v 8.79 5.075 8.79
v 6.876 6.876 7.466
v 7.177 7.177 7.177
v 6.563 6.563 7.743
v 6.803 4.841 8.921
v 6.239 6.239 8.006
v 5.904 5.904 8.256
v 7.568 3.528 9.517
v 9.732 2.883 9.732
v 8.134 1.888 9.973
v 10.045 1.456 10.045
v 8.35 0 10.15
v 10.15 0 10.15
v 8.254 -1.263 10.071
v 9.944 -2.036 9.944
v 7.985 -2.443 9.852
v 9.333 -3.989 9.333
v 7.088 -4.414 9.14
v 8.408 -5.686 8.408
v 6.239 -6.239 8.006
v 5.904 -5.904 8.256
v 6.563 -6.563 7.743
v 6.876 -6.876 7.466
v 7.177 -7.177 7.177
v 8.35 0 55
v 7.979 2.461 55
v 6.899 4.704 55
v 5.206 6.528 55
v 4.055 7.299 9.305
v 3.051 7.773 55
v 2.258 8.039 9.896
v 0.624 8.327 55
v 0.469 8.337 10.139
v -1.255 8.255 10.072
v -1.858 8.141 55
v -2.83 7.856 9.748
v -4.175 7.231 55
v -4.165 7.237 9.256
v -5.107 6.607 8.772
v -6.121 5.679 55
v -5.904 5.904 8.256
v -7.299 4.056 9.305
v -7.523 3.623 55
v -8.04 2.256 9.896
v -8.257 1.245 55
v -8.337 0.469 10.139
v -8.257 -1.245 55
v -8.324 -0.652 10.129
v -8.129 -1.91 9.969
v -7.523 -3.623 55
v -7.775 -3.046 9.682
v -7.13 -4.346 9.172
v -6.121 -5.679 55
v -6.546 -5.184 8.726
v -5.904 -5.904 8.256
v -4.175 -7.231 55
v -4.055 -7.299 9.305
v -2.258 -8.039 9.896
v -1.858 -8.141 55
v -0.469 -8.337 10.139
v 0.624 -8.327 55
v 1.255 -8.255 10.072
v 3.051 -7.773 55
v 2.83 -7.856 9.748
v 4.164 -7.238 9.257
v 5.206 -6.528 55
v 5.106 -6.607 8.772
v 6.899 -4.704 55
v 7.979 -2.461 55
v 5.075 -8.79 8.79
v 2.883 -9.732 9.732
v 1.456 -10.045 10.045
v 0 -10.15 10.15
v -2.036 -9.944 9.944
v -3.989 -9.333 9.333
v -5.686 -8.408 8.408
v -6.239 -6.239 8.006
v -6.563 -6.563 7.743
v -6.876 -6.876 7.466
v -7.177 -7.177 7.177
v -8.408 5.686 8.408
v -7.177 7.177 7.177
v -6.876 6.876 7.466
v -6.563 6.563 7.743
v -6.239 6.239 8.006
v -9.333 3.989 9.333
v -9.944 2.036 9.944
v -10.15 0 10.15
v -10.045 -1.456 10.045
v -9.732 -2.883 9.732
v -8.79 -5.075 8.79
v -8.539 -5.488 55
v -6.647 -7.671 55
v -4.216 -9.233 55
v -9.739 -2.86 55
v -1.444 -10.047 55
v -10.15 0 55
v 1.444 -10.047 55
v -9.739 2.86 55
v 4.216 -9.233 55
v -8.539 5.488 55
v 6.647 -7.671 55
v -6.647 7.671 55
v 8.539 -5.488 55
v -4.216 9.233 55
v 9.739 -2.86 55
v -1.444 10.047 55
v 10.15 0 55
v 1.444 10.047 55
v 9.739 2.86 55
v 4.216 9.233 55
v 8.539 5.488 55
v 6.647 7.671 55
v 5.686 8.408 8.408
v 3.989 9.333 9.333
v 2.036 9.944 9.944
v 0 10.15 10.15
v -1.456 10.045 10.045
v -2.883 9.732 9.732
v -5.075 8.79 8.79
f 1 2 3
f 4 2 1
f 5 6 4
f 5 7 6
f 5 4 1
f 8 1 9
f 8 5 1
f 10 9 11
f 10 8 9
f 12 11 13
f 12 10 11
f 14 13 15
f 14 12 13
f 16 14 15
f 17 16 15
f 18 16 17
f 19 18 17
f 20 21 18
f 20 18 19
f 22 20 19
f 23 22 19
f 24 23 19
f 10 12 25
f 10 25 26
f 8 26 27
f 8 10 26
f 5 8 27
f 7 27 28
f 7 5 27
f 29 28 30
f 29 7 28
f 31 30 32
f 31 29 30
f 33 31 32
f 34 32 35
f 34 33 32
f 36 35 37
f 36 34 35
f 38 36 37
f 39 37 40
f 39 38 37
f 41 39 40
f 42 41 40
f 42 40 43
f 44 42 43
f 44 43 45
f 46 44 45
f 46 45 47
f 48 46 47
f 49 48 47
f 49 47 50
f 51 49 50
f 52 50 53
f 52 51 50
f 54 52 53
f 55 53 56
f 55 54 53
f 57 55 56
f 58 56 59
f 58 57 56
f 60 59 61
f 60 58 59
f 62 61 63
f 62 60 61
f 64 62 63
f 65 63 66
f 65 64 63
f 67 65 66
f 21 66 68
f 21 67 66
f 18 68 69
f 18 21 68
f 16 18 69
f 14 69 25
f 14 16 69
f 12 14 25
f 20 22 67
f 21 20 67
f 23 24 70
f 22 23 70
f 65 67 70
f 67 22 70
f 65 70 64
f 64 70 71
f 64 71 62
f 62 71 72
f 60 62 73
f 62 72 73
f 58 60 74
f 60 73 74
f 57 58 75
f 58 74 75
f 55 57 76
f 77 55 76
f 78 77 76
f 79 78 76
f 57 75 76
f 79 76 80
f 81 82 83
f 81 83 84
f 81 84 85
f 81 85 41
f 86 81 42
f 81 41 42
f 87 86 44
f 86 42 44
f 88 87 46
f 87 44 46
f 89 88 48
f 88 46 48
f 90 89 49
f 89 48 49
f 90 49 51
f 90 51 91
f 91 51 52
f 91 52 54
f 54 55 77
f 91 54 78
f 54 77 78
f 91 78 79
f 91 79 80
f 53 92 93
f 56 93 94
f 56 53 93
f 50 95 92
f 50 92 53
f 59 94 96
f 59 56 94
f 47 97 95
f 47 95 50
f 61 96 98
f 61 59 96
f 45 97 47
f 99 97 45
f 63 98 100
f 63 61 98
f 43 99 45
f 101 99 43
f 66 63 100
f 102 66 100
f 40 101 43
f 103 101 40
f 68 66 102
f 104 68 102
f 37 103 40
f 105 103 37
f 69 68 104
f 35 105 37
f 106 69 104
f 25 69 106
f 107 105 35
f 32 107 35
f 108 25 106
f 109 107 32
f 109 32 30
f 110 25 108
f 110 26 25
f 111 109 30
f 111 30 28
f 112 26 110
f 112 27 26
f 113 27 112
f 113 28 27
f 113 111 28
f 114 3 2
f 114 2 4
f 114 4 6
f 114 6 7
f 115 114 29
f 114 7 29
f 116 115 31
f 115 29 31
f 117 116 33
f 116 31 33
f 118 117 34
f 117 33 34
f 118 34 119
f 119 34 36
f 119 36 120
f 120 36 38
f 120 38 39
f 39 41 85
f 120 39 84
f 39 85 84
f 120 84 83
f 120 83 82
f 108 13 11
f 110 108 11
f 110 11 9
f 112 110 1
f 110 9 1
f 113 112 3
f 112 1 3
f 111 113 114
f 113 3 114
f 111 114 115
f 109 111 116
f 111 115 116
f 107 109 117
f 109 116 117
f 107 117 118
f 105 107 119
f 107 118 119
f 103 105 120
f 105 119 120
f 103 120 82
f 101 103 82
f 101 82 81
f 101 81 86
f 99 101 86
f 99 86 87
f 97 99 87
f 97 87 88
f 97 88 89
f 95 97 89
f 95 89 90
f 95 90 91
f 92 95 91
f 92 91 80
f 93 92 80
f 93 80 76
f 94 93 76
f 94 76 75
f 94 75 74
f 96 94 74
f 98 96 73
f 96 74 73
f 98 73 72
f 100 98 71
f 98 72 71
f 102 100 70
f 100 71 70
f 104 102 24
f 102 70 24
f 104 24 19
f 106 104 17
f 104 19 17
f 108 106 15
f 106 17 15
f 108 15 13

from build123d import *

# Parameters (mm, degrees)
SKETCH008_R          = 10.15
SKETCH008_R_2        = 8.35
PAD006_DEPTH         = 55
SKETCH009_R          = 10.15
POCKET002_DEPTH      = 10.15
POCKET002_DEPTH_BACK = 10.15
SKETCH010_R          = 10.15
POCKET003_DEPTH      = 10.15
POCKET003_DEPTH_BACK = 10.15


with BuildPart() as part:
    # Sketch008 → Pad006 (new body)
    with BuildSketch(Plane.XY):
        Circle(SKETCH008_R)
        Circle(SKETCH008_R_2, mode=Mode.SUBTRACT)
    extrude(amount=PAD006_DEPTH)

    # Sketch009 → Pocket002 (cut, two sides)
    with BuildSketch(Plane.XZ) as pocket002_sk:
        Circle(SKETCH009_R)
    extrude(amount=-POCKET002_DEPTH, mode=Mode.SUBTRACT)
    extrude(pocket002_sk.sketch, amount=POCKET002_DEPTH_BACK, mode=Mode.SUBTRACT)

    # Sketch010 → Pocket003 (cut, two sides)
    with BuildSketch(Plane.YZ) as pocket003_sk:
        Circle(SKETCH010_R)
    extrude(amount=-POCKET003_DEPTH, mode=Mode.SUBTRACT)
    extrude(pocket003_sk.sketch, amount=POCKET003_DEPTH_BACK, mode=Mode.SUBTRACT)


solid = part.part
